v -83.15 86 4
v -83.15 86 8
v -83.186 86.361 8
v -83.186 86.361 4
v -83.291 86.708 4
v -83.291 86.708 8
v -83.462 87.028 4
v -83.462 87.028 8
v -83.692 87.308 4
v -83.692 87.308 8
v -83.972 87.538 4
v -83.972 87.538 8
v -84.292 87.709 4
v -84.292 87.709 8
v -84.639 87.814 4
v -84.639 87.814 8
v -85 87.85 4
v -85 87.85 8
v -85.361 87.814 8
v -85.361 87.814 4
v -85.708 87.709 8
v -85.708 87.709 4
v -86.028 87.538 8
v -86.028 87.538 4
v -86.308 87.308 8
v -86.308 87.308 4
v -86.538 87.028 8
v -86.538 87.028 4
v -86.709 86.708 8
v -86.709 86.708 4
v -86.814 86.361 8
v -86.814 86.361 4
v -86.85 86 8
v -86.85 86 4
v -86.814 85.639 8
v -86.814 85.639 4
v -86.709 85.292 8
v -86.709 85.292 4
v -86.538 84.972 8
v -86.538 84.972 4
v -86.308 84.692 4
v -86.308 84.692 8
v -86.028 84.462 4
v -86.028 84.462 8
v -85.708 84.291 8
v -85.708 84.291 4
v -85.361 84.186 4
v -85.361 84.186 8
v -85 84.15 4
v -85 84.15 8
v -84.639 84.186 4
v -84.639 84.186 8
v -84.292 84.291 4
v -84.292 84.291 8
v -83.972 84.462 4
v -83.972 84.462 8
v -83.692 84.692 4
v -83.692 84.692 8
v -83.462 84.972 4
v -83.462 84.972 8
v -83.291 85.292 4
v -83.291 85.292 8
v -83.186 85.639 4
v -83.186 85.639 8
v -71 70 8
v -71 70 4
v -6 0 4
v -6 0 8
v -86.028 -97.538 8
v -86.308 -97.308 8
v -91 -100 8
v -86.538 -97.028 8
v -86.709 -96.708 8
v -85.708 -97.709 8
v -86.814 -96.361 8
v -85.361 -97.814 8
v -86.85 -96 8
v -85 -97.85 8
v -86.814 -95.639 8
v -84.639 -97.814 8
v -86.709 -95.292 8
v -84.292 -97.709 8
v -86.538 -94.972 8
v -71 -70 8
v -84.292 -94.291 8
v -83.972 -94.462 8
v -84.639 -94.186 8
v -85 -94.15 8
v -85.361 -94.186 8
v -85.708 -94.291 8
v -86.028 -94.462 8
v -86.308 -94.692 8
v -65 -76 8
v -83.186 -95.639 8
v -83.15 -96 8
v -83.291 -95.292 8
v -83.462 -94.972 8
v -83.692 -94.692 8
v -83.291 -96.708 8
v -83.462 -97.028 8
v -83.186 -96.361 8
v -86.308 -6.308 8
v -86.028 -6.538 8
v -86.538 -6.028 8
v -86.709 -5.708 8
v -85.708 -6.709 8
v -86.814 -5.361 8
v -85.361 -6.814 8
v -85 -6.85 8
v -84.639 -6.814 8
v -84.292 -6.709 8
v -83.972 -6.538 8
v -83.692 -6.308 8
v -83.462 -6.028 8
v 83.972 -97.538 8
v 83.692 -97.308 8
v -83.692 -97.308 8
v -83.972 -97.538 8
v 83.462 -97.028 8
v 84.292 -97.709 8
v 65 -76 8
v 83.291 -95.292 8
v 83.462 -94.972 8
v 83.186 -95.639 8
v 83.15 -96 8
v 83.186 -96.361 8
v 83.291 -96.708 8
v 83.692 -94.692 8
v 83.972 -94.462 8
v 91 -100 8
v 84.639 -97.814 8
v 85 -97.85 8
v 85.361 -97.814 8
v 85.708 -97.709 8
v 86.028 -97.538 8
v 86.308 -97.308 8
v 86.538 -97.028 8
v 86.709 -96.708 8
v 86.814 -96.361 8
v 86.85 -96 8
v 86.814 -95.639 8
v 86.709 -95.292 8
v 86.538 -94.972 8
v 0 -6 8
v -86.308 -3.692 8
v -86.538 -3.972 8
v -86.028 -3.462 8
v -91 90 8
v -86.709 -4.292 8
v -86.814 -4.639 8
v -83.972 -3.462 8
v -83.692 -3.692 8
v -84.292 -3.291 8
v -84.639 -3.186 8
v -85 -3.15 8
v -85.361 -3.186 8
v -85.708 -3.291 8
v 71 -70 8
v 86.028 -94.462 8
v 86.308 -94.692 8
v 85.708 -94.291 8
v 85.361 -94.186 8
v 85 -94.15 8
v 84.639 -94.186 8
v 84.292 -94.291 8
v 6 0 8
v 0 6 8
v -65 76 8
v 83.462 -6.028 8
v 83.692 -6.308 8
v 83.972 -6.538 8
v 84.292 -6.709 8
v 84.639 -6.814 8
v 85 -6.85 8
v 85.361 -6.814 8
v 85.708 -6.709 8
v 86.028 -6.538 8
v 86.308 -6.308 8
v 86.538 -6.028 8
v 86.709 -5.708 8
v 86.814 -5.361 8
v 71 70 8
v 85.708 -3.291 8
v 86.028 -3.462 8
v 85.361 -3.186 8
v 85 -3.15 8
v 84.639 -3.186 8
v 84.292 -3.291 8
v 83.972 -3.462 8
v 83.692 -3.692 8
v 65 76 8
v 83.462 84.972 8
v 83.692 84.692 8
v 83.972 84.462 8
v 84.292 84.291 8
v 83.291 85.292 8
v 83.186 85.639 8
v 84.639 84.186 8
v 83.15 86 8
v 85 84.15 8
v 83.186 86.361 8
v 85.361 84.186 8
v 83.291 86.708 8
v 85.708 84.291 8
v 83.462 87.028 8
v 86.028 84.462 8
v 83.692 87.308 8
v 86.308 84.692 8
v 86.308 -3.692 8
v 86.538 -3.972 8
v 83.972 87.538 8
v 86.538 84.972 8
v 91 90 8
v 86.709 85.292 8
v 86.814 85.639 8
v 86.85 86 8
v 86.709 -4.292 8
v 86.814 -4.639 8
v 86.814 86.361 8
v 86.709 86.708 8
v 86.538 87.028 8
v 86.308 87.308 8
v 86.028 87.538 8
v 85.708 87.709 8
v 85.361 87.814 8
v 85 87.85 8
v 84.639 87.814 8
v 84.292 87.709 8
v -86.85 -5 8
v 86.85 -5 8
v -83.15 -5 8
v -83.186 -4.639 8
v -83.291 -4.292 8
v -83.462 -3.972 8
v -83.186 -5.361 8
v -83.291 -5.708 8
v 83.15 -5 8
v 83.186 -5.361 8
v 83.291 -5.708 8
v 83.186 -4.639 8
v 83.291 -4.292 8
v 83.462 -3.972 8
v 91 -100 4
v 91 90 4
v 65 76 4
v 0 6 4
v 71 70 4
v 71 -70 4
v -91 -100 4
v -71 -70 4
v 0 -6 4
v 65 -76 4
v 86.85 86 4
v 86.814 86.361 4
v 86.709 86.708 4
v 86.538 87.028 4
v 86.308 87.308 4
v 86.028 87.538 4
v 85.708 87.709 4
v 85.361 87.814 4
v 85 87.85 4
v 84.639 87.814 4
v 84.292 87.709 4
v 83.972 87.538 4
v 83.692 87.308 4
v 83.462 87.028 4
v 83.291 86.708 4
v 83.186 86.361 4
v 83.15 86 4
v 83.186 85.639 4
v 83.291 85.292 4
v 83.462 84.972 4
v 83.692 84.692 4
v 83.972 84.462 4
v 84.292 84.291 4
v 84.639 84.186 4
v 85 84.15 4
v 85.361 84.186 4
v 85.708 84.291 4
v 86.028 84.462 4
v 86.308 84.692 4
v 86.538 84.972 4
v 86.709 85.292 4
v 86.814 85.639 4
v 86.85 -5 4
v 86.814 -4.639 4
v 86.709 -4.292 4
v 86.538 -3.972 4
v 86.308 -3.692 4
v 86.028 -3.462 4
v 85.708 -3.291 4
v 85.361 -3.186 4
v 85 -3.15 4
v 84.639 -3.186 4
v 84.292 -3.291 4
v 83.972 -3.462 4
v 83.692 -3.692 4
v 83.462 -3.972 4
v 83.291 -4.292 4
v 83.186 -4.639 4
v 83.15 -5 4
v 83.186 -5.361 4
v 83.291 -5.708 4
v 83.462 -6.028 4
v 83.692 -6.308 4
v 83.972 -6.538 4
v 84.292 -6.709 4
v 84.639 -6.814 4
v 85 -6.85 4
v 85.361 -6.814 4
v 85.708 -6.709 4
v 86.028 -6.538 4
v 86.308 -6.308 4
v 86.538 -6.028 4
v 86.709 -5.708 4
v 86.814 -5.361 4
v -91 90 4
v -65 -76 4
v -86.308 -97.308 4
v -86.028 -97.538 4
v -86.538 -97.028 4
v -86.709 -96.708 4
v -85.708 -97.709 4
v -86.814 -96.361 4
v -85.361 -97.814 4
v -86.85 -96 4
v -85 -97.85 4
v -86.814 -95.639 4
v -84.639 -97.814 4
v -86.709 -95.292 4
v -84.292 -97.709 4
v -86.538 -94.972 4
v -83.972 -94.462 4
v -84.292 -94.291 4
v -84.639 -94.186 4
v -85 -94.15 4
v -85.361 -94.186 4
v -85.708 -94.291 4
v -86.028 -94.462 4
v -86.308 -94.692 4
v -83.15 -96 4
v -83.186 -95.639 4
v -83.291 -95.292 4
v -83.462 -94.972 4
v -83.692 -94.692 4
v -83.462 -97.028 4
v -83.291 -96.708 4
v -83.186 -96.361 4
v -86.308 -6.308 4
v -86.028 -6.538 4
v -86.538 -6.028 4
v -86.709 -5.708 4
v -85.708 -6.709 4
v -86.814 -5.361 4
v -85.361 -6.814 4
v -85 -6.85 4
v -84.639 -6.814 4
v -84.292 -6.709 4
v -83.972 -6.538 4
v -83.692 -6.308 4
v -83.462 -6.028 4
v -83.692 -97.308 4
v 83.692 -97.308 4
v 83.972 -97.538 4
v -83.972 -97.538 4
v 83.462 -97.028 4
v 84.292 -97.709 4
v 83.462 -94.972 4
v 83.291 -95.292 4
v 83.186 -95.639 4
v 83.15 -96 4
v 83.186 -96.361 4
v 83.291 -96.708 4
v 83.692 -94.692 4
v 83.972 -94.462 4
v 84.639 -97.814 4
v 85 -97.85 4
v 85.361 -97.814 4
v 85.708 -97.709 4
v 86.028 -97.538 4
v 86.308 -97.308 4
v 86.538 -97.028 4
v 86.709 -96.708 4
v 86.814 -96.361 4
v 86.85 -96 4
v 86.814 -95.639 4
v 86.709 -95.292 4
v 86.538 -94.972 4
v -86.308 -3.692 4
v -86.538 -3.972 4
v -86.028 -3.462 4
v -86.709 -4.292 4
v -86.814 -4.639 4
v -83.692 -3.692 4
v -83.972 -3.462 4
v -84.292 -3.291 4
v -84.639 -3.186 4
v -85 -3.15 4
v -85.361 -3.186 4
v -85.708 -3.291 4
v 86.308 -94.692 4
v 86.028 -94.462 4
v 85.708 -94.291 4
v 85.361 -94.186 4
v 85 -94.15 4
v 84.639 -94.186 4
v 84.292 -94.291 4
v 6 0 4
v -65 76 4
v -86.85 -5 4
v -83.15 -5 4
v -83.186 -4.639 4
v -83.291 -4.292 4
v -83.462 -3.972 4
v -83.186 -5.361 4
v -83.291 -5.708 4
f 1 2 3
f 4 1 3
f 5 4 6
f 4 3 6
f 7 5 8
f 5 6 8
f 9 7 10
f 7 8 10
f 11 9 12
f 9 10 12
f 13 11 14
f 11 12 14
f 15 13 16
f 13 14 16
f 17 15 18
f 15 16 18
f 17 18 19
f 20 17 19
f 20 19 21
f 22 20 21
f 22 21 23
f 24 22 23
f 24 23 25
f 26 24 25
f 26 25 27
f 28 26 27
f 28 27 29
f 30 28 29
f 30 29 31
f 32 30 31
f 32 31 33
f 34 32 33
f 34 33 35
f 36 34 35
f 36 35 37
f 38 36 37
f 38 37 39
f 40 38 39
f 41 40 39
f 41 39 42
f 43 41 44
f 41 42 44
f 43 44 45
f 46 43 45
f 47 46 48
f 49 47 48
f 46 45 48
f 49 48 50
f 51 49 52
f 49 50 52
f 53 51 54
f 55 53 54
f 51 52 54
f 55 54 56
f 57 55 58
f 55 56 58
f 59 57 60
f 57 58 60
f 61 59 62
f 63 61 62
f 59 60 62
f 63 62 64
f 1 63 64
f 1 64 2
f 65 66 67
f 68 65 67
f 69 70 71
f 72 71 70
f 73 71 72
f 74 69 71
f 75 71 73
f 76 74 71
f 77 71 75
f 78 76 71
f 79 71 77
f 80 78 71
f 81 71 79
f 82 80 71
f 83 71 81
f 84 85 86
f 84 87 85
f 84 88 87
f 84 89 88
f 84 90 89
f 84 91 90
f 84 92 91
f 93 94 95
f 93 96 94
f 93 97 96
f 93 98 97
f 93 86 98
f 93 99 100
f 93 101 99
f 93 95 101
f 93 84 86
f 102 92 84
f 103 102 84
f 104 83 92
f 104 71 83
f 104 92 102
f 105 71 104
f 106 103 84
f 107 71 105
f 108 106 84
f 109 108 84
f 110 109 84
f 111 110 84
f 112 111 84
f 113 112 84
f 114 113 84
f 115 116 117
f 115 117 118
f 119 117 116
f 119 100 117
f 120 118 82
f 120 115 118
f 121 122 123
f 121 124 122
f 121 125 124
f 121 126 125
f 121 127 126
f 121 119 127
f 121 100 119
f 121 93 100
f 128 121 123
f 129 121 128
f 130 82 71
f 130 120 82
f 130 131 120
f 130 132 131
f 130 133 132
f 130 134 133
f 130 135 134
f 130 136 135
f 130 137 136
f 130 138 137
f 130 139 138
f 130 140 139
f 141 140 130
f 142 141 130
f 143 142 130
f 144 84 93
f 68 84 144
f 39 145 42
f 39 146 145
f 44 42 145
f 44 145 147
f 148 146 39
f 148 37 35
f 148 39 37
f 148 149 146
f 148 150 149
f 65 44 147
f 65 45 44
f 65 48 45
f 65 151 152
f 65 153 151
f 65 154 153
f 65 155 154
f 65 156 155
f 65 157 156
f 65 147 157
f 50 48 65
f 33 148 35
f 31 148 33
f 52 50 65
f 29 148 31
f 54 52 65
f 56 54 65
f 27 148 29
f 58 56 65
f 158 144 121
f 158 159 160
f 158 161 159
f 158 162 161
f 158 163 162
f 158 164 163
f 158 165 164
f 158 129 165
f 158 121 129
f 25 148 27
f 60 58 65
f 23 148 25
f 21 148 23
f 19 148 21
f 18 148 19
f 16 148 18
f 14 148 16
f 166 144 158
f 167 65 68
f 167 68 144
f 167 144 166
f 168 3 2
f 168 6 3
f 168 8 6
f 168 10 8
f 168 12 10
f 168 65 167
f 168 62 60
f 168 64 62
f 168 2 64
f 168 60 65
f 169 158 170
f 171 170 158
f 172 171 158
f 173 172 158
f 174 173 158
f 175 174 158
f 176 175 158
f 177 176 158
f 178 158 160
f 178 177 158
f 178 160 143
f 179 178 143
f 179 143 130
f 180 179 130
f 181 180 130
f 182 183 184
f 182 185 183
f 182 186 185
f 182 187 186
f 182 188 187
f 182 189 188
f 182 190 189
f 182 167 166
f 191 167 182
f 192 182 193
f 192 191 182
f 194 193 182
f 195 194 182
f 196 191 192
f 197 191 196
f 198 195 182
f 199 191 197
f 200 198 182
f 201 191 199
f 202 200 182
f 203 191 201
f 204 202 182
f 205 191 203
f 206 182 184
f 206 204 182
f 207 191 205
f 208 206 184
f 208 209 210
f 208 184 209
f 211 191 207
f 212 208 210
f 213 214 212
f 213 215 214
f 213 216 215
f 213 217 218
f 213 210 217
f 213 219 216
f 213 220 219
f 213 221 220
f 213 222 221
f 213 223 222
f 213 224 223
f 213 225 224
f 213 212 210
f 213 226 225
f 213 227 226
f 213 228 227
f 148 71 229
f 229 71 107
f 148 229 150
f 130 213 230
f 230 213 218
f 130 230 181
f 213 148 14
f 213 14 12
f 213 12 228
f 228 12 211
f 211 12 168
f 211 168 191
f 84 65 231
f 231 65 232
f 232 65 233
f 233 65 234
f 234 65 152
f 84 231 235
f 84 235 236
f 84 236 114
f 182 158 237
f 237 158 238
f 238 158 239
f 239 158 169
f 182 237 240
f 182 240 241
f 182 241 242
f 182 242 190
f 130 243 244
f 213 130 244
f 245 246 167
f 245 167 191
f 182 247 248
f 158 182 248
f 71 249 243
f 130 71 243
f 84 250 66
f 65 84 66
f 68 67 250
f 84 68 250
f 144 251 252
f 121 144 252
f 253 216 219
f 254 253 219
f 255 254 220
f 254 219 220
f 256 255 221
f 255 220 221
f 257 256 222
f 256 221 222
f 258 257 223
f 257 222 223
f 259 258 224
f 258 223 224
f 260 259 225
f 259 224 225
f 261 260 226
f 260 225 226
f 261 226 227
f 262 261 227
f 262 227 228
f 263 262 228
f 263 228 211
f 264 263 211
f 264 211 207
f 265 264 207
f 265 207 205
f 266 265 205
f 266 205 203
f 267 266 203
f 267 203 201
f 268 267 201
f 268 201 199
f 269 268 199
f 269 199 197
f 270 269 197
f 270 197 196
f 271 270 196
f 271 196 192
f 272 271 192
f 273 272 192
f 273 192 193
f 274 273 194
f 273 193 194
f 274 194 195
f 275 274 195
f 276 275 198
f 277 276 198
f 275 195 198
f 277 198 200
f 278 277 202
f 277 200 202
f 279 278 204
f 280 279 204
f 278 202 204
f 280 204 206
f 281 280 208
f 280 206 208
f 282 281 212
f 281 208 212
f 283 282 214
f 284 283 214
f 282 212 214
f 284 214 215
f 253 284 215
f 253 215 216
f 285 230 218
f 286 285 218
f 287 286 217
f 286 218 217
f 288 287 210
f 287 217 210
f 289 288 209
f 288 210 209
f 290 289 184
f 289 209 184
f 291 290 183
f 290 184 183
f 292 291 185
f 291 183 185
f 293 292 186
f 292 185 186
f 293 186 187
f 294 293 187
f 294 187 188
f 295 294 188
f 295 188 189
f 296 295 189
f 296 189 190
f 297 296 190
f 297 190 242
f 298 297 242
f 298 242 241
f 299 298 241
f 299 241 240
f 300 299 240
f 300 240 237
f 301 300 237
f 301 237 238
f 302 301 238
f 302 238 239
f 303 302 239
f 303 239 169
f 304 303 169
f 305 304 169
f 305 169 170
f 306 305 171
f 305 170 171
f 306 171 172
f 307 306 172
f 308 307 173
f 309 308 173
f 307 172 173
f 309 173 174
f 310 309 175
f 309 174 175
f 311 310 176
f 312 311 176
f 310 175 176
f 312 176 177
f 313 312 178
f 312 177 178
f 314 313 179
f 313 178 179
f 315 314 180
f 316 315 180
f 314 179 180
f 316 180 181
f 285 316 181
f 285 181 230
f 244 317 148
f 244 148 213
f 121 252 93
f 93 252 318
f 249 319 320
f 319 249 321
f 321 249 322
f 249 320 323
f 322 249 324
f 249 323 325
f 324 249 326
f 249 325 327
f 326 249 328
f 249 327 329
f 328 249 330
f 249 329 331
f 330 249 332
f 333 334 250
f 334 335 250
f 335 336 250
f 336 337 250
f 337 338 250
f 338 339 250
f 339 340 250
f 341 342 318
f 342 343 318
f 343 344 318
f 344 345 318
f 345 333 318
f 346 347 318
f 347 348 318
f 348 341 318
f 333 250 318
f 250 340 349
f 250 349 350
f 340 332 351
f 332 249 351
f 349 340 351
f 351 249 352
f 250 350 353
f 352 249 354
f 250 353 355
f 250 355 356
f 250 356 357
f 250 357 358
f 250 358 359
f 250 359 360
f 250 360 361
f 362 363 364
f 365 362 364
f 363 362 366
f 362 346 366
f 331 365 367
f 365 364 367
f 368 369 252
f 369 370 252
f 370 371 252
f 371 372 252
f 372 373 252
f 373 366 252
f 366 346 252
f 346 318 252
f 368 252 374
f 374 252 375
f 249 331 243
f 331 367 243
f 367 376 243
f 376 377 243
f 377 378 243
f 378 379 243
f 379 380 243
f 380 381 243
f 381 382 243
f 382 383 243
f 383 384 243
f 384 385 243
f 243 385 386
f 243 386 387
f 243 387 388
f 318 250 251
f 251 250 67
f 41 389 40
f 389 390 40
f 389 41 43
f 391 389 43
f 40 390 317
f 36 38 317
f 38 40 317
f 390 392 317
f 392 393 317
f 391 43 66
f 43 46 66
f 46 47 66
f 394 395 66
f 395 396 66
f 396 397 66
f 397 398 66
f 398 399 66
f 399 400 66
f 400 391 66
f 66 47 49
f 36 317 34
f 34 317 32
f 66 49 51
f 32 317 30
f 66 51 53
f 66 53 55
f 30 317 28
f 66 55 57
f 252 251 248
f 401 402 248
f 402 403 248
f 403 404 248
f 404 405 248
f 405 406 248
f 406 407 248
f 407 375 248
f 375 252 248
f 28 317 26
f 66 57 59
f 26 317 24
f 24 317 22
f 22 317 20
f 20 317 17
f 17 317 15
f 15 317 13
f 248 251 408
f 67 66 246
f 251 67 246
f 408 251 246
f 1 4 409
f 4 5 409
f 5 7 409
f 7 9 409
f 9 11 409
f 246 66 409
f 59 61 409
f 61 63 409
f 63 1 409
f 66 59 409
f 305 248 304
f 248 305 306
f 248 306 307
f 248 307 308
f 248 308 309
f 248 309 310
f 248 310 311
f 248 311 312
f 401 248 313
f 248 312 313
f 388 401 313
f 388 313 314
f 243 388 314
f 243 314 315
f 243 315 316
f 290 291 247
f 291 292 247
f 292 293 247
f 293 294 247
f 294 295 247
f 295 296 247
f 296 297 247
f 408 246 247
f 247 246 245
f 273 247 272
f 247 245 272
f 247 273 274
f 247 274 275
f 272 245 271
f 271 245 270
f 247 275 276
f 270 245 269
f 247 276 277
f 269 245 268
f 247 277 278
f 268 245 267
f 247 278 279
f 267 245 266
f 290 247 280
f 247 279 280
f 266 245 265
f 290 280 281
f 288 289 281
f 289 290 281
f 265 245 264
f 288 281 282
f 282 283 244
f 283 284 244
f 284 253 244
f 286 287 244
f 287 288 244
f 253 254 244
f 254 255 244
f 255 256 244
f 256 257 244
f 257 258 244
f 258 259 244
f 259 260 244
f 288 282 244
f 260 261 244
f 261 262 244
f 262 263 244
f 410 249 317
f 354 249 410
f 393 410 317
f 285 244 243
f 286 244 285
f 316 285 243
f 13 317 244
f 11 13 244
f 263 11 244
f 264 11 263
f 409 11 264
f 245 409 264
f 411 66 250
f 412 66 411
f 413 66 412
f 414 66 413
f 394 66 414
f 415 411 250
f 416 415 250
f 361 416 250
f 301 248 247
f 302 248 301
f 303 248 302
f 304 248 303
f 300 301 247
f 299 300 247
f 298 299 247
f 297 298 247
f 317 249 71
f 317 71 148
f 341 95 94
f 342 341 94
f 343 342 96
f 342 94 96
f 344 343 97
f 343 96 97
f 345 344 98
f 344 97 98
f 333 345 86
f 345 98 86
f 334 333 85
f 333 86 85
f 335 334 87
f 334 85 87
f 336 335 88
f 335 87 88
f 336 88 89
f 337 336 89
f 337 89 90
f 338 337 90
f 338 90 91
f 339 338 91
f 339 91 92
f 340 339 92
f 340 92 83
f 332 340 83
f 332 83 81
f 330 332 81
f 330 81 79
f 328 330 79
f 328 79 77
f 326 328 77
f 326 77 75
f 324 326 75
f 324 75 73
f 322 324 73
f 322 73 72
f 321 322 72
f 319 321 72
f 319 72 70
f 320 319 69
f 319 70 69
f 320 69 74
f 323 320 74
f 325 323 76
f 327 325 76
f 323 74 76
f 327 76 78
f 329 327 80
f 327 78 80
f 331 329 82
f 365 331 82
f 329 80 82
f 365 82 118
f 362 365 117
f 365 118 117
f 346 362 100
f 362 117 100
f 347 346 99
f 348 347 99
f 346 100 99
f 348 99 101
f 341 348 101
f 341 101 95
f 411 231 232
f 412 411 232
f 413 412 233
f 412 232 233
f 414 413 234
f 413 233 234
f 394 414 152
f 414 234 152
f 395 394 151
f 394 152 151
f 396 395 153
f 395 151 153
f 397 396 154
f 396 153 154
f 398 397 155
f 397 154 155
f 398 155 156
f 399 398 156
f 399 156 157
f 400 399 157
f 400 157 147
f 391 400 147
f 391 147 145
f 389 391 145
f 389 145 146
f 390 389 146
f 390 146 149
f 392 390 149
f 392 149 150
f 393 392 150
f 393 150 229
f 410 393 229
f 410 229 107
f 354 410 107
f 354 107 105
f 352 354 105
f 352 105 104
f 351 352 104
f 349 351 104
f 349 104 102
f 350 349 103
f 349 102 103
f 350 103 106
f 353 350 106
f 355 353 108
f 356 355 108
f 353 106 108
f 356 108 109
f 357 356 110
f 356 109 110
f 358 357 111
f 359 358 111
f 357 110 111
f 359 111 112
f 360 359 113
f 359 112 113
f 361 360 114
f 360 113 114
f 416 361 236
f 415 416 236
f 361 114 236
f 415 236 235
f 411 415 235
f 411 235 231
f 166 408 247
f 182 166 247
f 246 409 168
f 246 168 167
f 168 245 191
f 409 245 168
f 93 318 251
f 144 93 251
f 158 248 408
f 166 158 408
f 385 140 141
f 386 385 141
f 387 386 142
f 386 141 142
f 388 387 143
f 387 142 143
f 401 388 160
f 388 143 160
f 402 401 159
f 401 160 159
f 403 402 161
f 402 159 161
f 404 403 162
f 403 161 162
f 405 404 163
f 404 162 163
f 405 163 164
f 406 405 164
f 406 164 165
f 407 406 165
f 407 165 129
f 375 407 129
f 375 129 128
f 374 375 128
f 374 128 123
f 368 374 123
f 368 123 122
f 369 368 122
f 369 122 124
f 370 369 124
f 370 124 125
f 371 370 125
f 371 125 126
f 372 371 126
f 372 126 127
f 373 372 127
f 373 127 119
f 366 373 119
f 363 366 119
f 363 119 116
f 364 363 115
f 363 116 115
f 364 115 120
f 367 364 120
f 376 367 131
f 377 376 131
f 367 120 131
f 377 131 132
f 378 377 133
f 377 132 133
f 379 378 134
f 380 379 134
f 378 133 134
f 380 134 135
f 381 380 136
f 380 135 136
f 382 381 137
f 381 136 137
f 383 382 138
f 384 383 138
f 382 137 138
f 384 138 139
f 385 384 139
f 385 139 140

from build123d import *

# Parameters (mm, degrees)
SKETCH001_W            = 182
SKETCH001_H            = 190
PAD_DEPTH              = 4
SKETCH154_R            = 1.85
POCKET004_DEPTH        = 130.001
LINEARPATTERN005_COUNT = 3
LINEARPATTERN005_PITCH = 91


with BuildPart() as part:
    # Sketch001 → Pad (new body)
    with BuildSketch(Plane.XY):
        with Locations((0, -5)):
            Rectangle(SKETCH001_W, SKETCH001_H)
        Polygon((-65, 76), (0, 6), (65, 76), align=None, mode=Mode.SUBTRACT)
        Polygon((-71, 70), (-6, 0), (-71, -70), align=None, mode=Mode.SUBTRACT)
        Polygon((-65, -76), (0, -6), (65, -76), align=None, mode=Mode.SUBTRACT)
        Polygon((71, -70), (6, 0), (71, 70), align=None, mode=Mode.SUBTRACT)
    extrude(amount=PAD_DEPTH)

    # Sketch154 → Pocket004 (cut, through all)
    with BuildSketch(Plane.XY.offset(130)):
        with Locations((-85, 86)):
            Circle(SKETCH154_R)
        with Locations((85, 86)):
            Circle(SKETCH154_R)
    pocket004 = extrude(amount=-POCKET004_DEPTH, mode=Mode.SUBTRACT)

    # LinearPattern005: Pocket004 ×3
    with Locations(*[(0, -i * LINEARPATTERN005_PITCH, 0) for i in range(1, LINEARPATTERN005_COUNT)]):
        add(pocket004, mode=Mode.SUBTRACT)


with BuildPart() as part_1:
    # Body placement: moved
    add(part.part.moved(Location((0, 0, 4))))


solid = part_1.part
